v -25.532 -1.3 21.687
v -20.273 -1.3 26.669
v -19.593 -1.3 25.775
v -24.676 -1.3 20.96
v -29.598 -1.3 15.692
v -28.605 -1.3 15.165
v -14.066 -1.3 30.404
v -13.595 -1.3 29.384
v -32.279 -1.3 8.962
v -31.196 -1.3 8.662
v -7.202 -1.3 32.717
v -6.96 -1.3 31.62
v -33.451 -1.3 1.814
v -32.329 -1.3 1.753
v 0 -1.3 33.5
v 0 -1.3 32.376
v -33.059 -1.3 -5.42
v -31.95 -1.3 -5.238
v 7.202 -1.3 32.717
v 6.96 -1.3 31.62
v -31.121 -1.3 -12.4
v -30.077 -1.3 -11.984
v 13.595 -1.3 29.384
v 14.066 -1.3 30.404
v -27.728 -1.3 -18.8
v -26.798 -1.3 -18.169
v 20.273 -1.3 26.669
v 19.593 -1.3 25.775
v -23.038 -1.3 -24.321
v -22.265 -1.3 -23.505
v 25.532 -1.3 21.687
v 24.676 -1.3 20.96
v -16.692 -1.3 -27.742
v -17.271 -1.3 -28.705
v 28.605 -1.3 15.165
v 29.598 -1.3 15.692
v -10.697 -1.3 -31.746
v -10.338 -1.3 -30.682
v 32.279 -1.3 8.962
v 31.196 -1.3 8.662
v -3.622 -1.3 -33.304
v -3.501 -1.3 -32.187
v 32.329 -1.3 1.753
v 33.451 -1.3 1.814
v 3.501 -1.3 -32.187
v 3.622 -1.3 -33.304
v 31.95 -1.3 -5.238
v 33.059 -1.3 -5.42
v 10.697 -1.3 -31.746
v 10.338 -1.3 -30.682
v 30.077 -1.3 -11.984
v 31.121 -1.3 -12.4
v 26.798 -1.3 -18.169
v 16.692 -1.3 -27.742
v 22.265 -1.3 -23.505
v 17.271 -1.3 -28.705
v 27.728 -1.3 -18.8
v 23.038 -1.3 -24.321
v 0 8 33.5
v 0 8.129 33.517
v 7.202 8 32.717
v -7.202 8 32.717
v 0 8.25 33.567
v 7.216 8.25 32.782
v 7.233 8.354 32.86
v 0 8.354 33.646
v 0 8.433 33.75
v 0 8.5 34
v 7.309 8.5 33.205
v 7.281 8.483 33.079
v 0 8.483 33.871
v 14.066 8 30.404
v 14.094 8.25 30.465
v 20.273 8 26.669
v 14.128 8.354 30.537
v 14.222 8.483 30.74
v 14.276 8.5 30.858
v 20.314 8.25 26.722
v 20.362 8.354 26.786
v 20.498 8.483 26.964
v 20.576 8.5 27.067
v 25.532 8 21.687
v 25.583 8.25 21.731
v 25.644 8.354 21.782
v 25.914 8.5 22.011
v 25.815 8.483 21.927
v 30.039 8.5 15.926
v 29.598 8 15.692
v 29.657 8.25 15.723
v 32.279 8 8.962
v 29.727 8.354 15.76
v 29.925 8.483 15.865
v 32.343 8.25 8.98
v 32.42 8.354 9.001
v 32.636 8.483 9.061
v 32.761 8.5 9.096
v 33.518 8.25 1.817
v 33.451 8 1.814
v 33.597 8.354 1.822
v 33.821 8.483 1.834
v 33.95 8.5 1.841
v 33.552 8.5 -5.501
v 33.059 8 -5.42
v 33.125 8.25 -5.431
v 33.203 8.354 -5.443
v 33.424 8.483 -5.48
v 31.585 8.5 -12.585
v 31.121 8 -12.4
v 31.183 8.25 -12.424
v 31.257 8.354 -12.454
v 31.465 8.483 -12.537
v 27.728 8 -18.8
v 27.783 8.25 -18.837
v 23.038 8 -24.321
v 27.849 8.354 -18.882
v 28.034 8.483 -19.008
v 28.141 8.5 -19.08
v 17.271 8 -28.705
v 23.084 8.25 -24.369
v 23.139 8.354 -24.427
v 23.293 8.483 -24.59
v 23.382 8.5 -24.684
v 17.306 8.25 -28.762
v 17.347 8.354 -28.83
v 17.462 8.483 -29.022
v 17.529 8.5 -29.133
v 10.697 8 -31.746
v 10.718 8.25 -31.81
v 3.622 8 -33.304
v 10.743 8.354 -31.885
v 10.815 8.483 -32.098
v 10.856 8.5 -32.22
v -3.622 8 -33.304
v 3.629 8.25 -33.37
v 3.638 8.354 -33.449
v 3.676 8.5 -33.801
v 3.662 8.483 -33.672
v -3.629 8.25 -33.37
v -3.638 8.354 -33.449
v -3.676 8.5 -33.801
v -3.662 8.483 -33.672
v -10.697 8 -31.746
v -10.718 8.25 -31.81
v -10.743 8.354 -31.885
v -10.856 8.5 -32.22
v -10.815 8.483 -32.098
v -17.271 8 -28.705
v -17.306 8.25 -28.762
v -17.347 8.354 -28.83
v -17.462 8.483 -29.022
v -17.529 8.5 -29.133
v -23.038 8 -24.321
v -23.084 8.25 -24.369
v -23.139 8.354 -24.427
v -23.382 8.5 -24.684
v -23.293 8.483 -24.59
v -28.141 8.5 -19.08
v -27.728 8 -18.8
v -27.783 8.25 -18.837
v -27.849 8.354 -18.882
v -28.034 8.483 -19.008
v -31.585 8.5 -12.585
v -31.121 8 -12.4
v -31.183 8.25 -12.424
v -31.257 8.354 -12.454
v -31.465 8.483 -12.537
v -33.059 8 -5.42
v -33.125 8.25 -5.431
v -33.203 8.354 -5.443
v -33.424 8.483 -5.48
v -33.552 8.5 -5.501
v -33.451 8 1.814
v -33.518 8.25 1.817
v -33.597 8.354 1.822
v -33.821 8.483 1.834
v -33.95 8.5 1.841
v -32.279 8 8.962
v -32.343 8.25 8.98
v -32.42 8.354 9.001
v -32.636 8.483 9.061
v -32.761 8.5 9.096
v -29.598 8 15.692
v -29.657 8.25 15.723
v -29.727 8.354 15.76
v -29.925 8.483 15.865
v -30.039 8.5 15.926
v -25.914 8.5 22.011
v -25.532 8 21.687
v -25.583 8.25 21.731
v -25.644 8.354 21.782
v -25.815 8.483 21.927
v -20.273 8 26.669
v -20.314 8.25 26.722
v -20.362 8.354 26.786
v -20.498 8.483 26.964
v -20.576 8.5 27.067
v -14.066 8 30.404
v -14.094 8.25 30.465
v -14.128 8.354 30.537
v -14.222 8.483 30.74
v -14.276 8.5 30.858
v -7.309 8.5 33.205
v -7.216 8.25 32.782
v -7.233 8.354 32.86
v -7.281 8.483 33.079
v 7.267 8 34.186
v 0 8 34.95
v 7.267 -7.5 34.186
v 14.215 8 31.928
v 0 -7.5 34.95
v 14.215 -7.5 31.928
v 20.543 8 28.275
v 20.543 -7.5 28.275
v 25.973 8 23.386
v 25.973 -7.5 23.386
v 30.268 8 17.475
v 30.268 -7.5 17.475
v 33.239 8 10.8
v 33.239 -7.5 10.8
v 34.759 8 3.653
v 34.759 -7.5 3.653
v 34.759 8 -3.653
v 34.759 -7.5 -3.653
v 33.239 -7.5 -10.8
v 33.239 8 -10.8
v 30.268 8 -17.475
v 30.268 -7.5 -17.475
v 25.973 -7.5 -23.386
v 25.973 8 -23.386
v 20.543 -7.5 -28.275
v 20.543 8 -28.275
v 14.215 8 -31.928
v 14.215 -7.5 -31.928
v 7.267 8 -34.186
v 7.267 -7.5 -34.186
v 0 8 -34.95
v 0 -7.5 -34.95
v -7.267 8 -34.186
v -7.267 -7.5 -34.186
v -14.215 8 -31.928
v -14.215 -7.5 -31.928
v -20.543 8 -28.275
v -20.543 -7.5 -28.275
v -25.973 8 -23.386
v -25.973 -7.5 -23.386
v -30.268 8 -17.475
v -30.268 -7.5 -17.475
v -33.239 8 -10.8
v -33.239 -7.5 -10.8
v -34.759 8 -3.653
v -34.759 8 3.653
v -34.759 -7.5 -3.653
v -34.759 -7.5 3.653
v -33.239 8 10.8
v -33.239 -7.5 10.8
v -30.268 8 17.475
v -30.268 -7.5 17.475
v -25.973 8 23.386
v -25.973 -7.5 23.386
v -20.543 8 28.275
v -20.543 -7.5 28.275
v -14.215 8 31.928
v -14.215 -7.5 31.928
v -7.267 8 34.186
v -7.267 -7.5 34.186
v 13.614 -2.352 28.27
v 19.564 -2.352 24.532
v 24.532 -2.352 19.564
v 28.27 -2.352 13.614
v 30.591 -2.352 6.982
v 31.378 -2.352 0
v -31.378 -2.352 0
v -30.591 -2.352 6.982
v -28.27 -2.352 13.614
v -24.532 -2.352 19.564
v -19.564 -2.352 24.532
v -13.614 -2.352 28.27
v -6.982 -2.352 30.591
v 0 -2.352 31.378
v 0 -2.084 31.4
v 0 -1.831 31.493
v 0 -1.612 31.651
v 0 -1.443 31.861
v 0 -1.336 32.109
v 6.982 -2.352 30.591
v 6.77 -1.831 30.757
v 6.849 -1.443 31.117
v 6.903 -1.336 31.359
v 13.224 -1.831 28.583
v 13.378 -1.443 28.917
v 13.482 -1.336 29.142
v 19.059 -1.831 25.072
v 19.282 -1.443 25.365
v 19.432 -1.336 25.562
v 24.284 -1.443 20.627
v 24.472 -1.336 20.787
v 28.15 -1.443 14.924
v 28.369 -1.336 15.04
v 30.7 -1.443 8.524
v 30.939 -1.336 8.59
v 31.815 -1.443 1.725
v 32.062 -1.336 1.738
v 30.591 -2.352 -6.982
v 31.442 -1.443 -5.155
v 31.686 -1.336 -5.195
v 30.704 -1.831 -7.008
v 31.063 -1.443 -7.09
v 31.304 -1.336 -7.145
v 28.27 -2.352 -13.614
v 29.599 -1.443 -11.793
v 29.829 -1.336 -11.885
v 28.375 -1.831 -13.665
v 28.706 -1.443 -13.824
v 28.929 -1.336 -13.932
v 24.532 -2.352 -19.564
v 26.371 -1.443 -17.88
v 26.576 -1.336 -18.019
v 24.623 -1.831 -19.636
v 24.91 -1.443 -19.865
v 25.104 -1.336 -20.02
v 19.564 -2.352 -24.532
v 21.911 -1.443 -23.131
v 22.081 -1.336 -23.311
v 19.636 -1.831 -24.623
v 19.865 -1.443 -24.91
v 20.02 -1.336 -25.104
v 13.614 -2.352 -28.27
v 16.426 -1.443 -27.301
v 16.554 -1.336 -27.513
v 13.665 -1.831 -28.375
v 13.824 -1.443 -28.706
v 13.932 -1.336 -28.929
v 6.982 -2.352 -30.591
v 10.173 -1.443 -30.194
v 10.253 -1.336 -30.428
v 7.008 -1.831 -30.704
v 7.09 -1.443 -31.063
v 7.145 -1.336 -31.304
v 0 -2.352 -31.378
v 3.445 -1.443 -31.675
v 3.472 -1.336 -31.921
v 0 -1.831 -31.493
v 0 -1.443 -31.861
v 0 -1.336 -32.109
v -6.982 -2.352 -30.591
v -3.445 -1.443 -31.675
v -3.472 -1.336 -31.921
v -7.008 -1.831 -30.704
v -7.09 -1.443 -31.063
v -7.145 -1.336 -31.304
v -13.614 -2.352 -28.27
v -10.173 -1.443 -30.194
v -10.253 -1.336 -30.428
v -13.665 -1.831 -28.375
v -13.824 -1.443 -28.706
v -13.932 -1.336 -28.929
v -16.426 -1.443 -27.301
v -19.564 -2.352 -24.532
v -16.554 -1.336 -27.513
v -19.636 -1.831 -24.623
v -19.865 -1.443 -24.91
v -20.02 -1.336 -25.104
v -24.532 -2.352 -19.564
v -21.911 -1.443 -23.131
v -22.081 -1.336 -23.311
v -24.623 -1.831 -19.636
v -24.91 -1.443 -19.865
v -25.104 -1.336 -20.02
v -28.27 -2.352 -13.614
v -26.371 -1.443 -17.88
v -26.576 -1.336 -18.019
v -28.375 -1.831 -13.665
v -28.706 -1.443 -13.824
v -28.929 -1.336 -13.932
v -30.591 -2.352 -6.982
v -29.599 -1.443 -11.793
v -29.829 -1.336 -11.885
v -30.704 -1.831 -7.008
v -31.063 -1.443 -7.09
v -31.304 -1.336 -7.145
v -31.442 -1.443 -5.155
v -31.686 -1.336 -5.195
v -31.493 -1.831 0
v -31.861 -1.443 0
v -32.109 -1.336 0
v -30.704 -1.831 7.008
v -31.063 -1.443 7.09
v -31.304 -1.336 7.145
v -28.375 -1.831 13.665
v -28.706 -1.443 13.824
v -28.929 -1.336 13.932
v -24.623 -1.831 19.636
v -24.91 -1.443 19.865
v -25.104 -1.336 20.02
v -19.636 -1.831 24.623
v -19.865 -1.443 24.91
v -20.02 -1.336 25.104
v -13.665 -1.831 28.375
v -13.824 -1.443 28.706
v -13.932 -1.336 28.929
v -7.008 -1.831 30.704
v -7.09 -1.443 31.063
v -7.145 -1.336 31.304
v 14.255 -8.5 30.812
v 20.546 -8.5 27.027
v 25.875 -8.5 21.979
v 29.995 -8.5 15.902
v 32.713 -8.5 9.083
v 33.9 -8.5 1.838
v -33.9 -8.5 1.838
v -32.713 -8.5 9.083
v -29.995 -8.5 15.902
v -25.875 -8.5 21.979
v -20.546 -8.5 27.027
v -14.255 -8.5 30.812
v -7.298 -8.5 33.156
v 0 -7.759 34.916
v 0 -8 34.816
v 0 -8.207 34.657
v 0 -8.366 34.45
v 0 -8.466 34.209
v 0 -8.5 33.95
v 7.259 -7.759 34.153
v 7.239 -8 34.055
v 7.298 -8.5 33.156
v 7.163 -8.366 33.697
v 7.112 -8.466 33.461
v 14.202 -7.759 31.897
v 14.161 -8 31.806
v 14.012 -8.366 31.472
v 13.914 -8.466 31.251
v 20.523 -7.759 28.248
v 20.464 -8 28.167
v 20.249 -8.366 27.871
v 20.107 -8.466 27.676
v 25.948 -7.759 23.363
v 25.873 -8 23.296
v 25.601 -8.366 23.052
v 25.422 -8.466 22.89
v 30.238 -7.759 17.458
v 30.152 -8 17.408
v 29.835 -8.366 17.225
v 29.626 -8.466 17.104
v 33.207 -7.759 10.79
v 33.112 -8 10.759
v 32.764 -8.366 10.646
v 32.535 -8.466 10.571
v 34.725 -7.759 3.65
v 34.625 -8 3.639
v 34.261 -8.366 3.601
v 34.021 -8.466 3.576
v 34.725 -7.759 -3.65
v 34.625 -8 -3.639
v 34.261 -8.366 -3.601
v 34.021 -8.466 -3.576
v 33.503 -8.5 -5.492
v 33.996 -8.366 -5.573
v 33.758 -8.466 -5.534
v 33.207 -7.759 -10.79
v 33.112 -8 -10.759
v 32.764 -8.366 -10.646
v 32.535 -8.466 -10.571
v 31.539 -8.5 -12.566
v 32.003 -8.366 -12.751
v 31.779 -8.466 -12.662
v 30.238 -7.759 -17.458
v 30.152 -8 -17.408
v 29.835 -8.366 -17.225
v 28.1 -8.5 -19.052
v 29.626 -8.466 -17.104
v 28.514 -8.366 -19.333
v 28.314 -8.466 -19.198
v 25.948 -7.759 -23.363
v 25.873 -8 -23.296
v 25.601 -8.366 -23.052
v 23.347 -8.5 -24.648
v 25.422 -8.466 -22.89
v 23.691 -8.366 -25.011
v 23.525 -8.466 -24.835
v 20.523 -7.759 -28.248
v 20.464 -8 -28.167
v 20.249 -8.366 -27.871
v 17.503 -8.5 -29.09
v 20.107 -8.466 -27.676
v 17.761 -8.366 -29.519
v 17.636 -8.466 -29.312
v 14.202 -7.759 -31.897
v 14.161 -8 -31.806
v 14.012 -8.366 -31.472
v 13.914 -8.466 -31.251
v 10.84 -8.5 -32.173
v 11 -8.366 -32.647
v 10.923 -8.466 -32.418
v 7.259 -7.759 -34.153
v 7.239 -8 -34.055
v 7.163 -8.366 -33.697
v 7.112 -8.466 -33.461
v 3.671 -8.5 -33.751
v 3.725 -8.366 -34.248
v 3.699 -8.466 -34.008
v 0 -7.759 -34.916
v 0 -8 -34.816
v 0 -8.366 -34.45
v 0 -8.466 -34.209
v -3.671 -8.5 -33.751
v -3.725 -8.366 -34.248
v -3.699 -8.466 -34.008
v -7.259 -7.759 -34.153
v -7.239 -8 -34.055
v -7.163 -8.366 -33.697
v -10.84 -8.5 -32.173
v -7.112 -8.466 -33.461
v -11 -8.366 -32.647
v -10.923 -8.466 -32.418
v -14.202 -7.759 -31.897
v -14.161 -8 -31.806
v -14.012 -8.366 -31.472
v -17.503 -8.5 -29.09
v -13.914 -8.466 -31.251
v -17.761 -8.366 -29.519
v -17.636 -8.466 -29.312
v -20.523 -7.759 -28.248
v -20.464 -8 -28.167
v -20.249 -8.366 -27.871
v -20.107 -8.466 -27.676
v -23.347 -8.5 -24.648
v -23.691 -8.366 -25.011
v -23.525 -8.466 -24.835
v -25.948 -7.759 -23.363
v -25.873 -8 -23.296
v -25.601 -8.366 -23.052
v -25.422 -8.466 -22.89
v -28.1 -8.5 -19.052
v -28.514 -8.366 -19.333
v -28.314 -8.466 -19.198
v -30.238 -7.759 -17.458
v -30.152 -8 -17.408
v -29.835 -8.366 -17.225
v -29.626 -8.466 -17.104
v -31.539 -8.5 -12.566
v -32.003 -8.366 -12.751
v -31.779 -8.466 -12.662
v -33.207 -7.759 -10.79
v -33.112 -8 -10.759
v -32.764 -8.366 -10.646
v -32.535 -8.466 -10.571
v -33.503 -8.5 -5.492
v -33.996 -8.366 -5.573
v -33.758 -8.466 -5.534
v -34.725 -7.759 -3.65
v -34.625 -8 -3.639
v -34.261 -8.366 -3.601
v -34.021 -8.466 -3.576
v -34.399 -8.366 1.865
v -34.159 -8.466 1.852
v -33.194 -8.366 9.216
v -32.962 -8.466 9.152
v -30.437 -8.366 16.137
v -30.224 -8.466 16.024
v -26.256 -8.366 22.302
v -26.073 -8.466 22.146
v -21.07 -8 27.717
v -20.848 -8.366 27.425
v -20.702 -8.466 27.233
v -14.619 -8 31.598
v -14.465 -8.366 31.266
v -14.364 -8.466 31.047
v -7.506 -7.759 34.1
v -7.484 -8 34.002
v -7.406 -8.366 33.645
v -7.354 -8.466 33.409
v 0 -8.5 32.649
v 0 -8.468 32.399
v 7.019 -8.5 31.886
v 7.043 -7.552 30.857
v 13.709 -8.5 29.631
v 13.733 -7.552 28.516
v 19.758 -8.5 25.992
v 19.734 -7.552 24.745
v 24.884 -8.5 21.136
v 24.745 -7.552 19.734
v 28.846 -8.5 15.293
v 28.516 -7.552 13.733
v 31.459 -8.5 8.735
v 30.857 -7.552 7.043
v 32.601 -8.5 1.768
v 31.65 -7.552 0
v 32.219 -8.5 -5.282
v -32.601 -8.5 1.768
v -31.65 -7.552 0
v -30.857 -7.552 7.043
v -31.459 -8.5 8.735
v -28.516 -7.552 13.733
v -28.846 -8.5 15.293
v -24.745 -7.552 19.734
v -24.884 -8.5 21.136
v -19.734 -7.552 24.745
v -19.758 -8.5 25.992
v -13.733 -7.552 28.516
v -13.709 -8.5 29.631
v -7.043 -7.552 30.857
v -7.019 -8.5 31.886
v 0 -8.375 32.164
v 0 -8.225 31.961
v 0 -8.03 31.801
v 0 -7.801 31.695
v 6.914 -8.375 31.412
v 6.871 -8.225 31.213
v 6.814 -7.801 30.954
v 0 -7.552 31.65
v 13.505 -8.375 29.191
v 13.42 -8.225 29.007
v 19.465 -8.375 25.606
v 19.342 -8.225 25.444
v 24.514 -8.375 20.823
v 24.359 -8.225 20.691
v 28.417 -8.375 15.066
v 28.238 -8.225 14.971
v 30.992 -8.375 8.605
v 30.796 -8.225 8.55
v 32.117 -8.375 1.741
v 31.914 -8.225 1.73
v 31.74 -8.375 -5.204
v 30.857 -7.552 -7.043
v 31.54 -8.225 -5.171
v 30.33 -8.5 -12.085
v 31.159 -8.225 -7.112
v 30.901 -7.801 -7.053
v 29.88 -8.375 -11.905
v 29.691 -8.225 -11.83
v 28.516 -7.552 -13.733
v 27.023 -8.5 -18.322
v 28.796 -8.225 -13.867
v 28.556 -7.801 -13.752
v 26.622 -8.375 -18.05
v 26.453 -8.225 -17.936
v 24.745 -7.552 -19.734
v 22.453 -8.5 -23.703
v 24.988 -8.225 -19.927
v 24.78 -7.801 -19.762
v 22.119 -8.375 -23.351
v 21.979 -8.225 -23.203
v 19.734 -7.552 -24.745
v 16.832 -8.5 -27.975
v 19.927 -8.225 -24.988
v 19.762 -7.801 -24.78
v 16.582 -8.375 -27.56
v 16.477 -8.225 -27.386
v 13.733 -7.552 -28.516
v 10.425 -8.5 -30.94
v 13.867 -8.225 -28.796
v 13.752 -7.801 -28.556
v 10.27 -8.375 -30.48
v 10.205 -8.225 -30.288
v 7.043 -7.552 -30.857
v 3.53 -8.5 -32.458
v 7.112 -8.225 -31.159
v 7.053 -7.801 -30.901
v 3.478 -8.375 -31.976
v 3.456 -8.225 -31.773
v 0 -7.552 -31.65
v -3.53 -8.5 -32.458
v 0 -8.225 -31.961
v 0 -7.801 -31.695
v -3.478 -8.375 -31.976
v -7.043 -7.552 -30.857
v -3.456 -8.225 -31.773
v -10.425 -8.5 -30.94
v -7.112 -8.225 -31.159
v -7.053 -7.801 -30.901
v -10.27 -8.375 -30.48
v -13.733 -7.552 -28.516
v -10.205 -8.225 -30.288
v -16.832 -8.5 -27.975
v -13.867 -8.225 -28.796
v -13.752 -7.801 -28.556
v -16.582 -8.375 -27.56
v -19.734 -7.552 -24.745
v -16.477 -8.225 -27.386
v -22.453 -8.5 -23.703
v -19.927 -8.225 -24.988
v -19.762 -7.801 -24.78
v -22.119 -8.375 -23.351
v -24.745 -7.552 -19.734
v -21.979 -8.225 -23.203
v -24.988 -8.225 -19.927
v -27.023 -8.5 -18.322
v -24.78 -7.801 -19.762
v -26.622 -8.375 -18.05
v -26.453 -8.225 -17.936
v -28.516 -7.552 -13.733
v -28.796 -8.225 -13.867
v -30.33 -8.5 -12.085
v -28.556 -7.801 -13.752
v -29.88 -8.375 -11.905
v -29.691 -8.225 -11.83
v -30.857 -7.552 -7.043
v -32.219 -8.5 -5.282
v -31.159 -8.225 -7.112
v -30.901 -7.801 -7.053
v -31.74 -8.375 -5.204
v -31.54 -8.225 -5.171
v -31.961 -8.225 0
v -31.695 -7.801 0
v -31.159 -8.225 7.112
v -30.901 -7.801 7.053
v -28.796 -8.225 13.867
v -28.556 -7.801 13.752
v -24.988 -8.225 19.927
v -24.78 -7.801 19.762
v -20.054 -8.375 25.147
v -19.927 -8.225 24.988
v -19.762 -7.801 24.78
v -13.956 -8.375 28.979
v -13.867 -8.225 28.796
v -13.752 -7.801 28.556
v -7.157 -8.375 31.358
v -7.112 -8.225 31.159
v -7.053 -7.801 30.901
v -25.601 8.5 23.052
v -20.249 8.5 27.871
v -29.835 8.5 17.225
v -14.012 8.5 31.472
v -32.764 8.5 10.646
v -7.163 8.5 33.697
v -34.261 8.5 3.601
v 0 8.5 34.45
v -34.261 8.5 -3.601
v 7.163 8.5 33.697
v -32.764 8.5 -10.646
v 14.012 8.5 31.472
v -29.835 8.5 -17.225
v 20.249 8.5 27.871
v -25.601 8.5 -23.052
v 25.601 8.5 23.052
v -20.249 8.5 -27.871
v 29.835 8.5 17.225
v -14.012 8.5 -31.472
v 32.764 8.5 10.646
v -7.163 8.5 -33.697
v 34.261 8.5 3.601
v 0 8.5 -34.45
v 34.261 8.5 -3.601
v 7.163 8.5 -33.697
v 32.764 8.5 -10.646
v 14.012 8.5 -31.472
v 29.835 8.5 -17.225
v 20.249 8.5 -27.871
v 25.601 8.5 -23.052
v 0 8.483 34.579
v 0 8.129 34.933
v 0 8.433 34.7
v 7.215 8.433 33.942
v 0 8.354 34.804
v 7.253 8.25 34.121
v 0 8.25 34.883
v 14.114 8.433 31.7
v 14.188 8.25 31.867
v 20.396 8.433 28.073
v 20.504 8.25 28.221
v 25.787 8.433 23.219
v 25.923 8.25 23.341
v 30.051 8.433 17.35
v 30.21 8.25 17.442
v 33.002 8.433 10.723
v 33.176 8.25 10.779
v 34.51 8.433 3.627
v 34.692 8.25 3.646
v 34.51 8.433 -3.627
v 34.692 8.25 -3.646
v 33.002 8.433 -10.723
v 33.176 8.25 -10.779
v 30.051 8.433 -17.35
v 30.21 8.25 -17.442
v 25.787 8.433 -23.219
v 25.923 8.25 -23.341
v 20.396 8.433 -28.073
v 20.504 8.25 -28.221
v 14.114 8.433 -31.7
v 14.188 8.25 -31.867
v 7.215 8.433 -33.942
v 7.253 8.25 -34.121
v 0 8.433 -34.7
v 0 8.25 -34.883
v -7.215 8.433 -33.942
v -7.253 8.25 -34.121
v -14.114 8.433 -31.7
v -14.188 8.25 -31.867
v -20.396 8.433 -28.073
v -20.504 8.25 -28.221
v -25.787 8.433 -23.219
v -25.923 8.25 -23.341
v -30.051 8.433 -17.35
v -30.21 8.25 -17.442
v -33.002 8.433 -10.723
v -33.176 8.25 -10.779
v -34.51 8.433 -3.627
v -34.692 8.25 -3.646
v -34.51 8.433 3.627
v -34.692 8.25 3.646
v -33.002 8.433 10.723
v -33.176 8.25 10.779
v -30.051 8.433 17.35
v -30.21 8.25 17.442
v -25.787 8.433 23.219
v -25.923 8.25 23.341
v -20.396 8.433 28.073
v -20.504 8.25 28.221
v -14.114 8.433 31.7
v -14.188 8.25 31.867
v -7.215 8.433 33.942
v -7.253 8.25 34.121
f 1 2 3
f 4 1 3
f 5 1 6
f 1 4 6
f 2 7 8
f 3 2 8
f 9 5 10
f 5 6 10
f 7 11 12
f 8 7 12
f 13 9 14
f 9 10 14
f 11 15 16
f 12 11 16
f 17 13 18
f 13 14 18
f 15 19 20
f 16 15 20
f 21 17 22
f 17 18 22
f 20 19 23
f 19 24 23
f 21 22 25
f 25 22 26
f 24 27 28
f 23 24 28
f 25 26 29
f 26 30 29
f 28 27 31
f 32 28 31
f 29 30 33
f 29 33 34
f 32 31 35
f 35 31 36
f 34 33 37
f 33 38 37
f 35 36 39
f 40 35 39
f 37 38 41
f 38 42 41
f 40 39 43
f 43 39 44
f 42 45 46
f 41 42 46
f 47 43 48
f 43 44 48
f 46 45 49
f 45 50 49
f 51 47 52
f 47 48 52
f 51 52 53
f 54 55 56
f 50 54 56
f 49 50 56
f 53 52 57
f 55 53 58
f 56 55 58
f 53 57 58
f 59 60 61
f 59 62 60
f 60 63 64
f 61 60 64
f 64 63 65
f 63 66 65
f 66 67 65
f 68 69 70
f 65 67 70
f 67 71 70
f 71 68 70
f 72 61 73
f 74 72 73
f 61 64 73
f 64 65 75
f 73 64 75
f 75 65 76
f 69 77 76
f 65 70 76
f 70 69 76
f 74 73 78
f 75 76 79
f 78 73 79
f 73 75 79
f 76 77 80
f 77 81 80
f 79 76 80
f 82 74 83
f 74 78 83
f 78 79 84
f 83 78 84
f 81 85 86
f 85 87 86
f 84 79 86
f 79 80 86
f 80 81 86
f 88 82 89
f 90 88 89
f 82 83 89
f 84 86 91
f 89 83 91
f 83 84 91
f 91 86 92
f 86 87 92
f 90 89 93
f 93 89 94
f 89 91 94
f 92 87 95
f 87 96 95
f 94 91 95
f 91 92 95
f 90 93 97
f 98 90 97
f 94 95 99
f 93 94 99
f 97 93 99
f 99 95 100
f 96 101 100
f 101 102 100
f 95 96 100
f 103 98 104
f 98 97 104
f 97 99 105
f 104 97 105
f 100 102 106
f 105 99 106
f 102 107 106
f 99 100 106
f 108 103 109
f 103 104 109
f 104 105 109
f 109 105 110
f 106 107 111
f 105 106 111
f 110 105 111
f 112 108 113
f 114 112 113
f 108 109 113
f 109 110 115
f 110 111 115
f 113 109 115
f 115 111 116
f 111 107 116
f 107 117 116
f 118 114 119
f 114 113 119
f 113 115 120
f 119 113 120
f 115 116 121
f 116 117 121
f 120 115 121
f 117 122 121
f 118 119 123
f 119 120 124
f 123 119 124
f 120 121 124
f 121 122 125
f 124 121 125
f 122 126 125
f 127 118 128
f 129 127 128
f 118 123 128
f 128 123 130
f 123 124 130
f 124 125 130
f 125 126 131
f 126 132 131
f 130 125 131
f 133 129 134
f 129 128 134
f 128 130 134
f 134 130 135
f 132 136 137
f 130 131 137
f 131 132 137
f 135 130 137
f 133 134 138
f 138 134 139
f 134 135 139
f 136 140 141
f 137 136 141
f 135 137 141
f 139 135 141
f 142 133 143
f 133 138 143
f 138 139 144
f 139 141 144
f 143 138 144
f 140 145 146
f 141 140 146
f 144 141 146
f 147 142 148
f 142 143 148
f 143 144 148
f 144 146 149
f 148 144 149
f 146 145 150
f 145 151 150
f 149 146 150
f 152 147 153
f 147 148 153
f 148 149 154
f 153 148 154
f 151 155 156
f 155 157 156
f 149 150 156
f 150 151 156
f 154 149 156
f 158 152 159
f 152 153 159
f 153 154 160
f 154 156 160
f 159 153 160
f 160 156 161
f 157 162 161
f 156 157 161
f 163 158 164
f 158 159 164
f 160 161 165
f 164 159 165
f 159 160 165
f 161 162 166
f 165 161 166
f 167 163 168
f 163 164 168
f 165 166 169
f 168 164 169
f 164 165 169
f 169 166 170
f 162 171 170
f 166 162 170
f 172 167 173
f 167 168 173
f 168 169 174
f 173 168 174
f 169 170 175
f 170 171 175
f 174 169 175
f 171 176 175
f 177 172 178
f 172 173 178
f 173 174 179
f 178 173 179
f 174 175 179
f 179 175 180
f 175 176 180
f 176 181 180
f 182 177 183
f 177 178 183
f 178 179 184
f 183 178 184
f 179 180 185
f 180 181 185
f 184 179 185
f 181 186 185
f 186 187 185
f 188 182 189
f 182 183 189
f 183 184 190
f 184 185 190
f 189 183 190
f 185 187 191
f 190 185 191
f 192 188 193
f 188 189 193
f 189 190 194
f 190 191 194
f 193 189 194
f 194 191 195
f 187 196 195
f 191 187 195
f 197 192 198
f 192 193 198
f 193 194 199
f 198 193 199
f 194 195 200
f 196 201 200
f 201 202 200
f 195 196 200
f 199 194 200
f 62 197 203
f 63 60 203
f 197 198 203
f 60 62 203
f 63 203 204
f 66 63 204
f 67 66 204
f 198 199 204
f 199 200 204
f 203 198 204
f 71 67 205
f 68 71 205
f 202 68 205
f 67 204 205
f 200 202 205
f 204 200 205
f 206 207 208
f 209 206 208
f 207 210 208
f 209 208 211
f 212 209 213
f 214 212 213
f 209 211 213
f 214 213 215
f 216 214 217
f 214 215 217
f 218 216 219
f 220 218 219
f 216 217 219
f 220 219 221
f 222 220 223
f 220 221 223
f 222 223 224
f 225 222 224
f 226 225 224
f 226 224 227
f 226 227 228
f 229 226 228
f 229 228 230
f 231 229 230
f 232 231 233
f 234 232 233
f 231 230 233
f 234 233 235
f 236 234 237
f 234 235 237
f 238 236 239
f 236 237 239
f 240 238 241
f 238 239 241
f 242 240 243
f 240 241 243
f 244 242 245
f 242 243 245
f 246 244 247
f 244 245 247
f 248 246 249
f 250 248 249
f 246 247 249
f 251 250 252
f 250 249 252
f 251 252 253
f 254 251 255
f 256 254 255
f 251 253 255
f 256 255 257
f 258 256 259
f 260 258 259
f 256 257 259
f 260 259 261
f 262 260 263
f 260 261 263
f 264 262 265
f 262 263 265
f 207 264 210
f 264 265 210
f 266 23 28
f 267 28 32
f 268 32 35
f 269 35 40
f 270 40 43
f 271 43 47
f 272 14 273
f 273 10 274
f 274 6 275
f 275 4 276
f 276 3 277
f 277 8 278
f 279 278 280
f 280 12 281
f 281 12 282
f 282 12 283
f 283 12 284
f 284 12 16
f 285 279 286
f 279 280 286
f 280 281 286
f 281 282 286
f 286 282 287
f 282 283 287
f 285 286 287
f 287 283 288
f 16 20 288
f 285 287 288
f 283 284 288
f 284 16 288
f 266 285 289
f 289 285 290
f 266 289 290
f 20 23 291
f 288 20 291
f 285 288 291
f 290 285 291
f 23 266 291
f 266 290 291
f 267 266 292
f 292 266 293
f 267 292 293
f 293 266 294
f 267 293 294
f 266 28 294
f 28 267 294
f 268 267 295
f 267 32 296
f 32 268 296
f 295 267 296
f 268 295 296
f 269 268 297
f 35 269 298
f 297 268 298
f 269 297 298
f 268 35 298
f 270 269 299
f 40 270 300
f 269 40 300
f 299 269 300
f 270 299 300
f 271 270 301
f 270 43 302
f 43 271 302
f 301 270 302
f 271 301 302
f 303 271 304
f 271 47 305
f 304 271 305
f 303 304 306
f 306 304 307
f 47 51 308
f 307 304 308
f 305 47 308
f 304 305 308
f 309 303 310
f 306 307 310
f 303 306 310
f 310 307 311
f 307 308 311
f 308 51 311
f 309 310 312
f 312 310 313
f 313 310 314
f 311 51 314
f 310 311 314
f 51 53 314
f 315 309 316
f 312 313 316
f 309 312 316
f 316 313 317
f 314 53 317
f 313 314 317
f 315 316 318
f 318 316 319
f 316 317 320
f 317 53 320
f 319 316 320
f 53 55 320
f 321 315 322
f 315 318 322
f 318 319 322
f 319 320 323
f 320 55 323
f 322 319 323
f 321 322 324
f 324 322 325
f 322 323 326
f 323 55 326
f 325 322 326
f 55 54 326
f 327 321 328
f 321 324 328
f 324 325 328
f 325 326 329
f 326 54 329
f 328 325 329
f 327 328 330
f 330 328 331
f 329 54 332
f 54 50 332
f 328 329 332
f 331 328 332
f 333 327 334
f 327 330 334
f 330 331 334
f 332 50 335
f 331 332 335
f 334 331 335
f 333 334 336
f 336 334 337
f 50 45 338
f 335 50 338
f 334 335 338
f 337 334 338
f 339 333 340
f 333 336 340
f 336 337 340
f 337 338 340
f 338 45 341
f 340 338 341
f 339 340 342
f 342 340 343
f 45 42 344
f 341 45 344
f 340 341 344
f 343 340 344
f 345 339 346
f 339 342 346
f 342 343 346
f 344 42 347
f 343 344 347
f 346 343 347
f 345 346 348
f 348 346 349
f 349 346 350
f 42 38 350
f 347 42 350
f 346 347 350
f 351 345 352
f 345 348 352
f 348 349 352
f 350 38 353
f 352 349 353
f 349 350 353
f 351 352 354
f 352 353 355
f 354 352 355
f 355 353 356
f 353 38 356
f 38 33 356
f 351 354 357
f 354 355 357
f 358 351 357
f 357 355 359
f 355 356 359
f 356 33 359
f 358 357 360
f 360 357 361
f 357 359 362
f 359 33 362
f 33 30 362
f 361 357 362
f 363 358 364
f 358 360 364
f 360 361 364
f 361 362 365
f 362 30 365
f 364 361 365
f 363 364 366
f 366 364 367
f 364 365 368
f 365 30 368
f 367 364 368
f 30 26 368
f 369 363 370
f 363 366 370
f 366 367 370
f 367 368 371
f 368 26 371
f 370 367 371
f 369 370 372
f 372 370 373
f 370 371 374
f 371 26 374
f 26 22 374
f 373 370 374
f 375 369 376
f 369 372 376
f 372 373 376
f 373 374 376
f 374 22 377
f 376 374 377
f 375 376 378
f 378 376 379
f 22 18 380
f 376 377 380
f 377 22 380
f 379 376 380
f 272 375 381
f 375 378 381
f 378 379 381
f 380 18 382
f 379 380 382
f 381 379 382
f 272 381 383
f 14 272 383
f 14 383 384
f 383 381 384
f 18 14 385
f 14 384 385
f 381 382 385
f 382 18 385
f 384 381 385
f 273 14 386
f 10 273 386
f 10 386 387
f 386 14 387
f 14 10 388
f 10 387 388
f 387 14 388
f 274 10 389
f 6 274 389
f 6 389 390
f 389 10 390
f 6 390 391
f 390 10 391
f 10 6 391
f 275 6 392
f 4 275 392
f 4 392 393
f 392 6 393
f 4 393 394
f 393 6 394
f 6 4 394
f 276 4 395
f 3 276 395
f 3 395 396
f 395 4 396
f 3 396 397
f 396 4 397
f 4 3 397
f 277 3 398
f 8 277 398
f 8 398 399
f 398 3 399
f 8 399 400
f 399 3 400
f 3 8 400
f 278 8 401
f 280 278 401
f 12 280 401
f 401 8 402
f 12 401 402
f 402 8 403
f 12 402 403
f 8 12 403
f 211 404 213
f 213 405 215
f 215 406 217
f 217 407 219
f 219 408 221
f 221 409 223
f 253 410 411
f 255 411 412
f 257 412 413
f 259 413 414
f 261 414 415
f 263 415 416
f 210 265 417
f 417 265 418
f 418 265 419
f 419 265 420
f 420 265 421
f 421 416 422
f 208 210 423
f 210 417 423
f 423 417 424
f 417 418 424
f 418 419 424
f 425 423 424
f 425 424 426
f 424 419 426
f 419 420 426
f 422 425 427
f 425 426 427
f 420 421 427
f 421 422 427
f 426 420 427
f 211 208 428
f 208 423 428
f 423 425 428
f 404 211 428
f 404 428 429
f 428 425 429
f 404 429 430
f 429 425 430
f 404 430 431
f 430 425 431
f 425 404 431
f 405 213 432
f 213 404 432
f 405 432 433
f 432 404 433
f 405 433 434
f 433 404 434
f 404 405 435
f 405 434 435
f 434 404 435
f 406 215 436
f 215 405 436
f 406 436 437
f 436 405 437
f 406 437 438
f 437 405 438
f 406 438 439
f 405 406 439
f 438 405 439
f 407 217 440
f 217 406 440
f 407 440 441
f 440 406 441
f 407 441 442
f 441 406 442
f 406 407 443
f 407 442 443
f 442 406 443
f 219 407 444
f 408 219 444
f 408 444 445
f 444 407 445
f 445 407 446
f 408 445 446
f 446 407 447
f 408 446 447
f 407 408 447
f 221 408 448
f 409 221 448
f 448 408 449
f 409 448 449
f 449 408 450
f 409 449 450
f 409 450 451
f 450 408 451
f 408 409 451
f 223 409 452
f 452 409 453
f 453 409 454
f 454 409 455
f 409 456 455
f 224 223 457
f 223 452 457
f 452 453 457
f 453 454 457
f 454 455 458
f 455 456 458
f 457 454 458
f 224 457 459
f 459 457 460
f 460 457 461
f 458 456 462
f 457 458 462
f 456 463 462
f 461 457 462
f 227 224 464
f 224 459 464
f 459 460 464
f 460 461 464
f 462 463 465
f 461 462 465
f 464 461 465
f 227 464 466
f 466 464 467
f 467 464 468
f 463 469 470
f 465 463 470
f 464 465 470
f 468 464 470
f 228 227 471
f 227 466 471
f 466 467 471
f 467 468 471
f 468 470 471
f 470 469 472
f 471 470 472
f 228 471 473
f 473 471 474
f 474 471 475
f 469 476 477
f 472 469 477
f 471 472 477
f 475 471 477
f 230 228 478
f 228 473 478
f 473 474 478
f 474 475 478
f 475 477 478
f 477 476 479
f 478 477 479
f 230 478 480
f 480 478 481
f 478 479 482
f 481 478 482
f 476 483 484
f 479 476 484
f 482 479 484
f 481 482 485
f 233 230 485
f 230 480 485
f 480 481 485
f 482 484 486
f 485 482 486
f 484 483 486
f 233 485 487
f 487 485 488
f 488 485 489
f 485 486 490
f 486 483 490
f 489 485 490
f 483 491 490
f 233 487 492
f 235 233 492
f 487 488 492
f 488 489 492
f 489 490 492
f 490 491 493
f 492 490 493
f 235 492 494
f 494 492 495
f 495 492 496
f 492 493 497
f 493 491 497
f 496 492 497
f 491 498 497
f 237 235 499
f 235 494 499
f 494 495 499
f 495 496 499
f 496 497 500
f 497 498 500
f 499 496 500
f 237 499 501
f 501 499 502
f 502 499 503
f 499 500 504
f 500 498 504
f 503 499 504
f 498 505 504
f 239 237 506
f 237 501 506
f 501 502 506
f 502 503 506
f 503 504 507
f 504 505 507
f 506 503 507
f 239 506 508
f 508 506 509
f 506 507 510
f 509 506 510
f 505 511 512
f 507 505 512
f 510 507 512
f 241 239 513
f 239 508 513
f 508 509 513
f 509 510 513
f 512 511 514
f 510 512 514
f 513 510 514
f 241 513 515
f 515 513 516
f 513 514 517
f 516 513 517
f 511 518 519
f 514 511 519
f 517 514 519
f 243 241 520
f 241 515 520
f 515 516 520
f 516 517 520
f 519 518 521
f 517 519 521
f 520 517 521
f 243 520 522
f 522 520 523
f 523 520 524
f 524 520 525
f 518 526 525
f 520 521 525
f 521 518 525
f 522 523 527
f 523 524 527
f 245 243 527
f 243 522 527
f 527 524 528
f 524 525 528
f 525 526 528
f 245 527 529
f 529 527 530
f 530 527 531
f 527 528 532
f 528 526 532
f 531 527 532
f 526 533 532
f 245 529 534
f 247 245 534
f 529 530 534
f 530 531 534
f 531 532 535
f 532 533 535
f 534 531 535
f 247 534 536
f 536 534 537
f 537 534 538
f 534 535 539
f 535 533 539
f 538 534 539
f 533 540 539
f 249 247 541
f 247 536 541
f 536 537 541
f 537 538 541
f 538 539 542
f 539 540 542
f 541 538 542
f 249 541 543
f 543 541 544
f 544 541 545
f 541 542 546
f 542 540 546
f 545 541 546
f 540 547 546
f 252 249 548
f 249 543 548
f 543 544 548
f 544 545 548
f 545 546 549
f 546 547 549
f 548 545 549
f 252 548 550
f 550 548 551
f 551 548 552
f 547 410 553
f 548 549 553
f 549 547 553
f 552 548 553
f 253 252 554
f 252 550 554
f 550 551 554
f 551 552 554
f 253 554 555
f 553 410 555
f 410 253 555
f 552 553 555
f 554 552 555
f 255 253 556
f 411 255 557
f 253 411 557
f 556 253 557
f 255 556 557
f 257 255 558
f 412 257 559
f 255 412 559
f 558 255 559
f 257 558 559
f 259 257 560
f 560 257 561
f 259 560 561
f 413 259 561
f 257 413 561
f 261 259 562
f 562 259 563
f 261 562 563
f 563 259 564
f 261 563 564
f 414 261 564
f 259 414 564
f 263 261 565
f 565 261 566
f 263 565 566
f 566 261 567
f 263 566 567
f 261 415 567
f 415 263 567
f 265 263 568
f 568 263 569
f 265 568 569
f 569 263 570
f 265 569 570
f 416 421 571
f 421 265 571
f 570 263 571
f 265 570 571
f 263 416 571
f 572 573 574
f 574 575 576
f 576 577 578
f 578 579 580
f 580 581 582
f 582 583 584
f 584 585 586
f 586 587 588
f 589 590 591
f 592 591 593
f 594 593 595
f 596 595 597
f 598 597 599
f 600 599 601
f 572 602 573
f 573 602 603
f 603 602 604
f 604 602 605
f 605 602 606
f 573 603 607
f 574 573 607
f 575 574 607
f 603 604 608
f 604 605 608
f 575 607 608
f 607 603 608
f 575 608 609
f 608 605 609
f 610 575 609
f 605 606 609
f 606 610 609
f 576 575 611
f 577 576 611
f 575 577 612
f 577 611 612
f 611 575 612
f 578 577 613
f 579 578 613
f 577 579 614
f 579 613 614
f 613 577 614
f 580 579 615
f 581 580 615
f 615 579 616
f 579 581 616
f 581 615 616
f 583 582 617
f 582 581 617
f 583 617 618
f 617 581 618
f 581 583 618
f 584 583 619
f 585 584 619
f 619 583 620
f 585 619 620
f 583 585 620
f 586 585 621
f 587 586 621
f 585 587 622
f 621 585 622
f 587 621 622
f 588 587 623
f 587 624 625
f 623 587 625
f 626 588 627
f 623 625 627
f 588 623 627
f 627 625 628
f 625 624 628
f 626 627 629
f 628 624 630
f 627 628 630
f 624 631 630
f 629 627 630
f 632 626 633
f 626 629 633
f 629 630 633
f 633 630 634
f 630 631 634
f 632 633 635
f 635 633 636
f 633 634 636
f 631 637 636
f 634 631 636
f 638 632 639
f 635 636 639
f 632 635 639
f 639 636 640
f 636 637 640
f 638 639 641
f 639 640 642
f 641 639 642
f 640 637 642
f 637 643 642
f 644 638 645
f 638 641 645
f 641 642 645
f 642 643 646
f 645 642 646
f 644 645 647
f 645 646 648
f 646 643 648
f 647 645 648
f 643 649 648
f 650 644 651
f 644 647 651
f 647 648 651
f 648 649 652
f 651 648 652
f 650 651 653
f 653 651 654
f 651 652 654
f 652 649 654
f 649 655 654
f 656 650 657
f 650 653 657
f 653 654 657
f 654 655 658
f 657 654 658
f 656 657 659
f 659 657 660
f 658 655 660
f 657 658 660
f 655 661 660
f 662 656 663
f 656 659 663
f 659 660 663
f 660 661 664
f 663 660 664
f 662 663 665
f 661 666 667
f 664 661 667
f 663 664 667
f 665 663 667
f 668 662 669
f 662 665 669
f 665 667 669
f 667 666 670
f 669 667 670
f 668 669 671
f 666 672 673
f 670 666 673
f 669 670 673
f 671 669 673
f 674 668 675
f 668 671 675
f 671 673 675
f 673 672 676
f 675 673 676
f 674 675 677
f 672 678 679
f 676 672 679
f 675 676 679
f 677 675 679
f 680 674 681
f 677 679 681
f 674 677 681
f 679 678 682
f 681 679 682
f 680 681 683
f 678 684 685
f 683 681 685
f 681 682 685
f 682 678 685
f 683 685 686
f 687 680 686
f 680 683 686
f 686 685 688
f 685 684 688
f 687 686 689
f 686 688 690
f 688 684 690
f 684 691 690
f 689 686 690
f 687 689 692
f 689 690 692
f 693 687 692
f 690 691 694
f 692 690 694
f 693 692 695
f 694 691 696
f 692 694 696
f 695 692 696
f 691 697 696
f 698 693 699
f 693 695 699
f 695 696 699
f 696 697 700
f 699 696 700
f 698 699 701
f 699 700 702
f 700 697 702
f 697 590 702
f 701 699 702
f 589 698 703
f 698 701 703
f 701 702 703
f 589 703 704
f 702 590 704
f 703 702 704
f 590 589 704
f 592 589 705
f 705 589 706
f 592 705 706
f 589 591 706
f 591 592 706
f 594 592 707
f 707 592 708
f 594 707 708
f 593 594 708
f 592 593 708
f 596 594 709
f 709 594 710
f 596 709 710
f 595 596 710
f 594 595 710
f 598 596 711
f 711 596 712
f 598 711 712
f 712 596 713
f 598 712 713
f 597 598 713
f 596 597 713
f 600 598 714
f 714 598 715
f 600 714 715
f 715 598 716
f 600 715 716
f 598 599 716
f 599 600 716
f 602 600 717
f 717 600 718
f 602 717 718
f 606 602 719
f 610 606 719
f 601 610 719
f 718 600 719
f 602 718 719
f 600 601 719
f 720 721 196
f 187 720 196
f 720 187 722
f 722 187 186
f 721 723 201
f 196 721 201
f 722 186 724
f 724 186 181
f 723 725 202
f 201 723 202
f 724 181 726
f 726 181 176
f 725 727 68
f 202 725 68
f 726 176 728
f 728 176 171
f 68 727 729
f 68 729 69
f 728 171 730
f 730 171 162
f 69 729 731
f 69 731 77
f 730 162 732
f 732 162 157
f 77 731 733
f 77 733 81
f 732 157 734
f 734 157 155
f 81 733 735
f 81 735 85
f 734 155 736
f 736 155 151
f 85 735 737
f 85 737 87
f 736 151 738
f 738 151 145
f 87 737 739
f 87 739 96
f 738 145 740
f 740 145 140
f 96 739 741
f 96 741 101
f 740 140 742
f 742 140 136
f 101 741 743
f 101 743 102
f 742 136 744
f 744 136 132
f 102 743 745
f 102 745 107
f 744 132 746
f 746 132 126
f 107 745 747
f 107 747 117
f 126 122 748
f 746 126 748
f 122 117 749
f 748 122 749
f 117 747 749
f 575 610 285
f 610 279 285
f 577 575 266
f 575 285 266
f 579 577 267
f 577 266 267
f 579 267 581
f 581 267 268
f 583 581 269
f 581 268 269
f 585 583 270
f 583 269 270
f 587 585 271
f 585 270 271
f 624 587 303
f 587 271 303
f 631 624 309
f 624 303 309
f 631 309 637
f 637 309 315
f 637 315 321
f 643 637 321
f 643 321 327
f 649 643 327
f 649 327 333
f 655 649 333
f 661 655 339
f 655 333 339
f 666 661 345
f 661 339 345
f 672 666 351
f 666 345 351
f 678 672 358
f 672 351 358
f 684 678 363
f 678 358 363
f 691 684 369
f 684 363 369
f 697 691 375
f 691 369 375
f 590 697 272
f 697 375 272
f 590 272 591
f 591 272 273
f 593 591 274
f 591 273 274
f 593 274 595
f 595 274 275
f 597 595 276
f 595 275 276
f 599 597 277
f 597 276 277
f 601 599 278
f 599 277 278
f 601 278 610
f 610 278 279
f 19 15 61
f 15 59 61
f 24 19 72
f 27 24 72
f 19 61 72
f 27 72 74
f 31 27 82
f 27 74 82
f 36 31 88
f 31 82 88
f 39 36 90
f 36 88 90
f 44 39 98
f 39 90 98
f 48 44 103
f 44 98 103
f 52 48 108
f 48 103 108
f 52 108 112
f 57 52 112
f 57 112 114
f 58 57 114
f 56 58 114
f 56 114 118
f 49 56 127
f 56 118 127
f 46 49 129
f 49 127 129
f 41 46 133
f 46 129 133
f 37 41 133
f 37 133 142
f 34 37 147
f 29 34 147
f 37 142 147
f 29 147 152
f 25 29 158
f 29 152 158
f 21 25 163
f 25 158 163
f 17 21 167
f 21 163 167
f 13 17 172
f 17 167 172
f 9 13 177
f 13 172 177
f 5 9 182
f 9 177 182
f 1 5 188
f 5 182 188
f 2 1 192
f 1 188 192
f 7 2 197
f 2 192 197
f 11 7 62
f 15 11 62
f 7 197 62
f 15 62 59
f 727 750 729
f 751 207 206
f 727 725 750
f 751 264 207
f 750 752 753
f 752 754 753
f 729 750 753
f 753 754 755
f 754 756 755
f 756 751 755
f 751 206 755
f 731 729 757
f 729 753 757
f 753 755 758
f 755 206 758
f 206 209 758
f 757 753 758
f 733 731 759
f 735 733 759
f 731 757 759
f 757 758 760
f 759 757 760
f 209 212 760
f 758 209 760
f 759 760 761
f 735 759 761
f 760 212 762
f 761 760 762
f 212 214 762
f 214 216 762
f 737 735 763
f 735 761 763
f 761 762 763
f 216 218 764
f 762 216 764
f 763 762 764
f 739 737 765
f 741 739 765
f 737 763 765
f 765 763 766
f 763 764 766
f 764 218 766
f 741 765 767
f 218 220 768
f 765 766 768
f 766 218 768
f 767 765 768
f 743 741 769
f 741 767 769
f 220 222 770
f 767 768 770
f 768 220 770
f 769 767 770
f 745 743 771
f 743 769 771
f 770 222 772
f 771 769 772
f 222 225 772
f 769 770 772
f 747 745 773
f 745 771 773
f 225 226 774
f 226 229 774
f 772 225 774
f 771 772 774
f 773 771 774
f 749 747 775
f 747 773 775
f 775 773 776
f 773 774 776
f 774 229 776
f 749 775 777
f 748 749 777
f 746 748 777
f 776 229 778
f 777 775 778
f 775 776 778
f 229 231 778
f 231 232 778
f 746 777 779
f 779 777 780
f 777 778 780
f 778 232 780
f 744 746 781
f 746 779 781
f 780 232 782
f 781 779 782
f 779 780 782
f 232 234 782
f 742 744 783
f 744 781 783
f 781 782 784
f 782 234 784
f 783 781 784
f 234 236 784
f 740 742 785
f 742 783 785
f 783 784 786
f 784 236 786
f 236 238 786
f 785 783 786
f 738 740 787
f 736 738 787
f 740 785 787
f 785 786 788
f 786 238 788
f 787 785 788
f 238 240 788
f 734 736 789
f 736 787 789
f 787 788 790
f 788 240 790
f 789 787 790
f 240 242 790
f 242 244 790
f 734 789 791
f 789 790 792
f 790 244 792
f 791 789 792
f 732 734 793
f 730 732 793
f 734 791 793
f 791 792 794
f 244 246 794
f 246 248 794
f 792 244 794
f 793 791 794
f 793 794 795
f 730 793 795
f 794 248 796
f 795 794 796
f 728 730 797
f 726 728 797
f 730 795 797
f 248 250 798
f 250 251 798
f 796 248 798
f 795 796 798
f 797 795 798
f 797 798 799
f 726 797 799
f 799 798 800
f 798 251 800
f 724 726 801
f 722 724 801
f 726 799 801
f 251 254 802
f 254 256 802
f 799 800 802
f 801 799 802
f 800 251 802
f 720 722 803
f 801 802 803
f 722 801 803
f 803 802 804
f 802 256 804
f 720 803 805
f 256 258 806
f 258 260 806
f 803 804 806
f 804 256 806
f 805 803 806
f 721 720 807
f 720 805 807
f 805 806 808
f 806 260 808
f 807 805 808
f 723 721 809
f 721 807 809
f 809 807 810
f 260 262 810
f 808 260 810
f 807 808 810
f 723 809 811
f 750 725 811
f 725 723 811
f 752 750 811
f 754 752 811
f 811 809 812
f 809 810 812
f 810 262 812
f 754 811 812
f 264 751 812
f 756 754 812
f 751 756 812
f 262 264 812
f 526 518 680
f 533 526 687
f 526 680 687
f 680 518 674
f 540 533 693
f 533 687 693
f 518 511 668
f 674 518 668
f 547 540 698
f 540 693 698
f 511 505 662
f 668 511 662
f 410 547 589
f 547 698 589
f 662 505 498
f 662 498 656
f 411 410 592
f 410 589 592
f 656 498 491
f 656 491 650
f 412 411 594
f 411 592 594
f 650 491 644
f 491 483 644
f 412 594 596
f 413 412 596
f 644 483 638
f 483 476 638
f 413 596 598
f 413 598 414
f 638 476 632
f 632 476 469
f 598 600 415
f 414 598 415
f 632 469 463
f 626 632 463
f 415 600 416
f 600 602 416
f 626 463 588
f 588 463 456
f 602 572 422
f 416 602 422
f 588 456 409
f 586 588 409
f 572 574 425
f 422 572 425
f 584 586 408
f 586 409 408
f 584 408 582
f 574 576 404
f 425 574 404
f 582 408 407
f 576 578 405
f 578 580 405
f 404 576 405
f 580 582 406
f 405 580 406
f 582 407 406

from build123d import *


with BuildPart() as f1:
    # F0 (on Right) → F1 (revolve)
    with BuildSketch(Plane.YZ):
        with BuildLine():
            Line((8, 34.95), (-7.5, 34.95))
            ThreePointArc((-7.5, 34.95), (-8.207107, 34.657107), (-8.5, 33.95))
            Line((-8.5, 33.95), (-8.5, 32.648965))
            ThreePointArc((-8.5, 32.648965), (-8.225374, 31.96061), (-7.552336, 31.650335))
            Line((-7.552336, 31.650335), (-2.352336, 31.377815))
            ThreePointArc((-2.352336, 31.377815), (-1.611645, 31.65107), (-1.3, 32.376444))
            Line((-1.3, 32.376444), (-1.3, 33.5))
            Line((-1.3, 33.5), (8, 33.5))
            ThreePointArc((8, 33.5), (8.353553, 33.646447), (8.5, 34))
            Line((8.5, 34), (8.5, 34.45))
            ThreePointArc((8.5, 34.45), (8.353553, 34.803553), (8, 34.95))
        make_face()
    revolve(axis=Axis((0, -1.514213, 0), (0, 1, 0)))


solid = f1.part
